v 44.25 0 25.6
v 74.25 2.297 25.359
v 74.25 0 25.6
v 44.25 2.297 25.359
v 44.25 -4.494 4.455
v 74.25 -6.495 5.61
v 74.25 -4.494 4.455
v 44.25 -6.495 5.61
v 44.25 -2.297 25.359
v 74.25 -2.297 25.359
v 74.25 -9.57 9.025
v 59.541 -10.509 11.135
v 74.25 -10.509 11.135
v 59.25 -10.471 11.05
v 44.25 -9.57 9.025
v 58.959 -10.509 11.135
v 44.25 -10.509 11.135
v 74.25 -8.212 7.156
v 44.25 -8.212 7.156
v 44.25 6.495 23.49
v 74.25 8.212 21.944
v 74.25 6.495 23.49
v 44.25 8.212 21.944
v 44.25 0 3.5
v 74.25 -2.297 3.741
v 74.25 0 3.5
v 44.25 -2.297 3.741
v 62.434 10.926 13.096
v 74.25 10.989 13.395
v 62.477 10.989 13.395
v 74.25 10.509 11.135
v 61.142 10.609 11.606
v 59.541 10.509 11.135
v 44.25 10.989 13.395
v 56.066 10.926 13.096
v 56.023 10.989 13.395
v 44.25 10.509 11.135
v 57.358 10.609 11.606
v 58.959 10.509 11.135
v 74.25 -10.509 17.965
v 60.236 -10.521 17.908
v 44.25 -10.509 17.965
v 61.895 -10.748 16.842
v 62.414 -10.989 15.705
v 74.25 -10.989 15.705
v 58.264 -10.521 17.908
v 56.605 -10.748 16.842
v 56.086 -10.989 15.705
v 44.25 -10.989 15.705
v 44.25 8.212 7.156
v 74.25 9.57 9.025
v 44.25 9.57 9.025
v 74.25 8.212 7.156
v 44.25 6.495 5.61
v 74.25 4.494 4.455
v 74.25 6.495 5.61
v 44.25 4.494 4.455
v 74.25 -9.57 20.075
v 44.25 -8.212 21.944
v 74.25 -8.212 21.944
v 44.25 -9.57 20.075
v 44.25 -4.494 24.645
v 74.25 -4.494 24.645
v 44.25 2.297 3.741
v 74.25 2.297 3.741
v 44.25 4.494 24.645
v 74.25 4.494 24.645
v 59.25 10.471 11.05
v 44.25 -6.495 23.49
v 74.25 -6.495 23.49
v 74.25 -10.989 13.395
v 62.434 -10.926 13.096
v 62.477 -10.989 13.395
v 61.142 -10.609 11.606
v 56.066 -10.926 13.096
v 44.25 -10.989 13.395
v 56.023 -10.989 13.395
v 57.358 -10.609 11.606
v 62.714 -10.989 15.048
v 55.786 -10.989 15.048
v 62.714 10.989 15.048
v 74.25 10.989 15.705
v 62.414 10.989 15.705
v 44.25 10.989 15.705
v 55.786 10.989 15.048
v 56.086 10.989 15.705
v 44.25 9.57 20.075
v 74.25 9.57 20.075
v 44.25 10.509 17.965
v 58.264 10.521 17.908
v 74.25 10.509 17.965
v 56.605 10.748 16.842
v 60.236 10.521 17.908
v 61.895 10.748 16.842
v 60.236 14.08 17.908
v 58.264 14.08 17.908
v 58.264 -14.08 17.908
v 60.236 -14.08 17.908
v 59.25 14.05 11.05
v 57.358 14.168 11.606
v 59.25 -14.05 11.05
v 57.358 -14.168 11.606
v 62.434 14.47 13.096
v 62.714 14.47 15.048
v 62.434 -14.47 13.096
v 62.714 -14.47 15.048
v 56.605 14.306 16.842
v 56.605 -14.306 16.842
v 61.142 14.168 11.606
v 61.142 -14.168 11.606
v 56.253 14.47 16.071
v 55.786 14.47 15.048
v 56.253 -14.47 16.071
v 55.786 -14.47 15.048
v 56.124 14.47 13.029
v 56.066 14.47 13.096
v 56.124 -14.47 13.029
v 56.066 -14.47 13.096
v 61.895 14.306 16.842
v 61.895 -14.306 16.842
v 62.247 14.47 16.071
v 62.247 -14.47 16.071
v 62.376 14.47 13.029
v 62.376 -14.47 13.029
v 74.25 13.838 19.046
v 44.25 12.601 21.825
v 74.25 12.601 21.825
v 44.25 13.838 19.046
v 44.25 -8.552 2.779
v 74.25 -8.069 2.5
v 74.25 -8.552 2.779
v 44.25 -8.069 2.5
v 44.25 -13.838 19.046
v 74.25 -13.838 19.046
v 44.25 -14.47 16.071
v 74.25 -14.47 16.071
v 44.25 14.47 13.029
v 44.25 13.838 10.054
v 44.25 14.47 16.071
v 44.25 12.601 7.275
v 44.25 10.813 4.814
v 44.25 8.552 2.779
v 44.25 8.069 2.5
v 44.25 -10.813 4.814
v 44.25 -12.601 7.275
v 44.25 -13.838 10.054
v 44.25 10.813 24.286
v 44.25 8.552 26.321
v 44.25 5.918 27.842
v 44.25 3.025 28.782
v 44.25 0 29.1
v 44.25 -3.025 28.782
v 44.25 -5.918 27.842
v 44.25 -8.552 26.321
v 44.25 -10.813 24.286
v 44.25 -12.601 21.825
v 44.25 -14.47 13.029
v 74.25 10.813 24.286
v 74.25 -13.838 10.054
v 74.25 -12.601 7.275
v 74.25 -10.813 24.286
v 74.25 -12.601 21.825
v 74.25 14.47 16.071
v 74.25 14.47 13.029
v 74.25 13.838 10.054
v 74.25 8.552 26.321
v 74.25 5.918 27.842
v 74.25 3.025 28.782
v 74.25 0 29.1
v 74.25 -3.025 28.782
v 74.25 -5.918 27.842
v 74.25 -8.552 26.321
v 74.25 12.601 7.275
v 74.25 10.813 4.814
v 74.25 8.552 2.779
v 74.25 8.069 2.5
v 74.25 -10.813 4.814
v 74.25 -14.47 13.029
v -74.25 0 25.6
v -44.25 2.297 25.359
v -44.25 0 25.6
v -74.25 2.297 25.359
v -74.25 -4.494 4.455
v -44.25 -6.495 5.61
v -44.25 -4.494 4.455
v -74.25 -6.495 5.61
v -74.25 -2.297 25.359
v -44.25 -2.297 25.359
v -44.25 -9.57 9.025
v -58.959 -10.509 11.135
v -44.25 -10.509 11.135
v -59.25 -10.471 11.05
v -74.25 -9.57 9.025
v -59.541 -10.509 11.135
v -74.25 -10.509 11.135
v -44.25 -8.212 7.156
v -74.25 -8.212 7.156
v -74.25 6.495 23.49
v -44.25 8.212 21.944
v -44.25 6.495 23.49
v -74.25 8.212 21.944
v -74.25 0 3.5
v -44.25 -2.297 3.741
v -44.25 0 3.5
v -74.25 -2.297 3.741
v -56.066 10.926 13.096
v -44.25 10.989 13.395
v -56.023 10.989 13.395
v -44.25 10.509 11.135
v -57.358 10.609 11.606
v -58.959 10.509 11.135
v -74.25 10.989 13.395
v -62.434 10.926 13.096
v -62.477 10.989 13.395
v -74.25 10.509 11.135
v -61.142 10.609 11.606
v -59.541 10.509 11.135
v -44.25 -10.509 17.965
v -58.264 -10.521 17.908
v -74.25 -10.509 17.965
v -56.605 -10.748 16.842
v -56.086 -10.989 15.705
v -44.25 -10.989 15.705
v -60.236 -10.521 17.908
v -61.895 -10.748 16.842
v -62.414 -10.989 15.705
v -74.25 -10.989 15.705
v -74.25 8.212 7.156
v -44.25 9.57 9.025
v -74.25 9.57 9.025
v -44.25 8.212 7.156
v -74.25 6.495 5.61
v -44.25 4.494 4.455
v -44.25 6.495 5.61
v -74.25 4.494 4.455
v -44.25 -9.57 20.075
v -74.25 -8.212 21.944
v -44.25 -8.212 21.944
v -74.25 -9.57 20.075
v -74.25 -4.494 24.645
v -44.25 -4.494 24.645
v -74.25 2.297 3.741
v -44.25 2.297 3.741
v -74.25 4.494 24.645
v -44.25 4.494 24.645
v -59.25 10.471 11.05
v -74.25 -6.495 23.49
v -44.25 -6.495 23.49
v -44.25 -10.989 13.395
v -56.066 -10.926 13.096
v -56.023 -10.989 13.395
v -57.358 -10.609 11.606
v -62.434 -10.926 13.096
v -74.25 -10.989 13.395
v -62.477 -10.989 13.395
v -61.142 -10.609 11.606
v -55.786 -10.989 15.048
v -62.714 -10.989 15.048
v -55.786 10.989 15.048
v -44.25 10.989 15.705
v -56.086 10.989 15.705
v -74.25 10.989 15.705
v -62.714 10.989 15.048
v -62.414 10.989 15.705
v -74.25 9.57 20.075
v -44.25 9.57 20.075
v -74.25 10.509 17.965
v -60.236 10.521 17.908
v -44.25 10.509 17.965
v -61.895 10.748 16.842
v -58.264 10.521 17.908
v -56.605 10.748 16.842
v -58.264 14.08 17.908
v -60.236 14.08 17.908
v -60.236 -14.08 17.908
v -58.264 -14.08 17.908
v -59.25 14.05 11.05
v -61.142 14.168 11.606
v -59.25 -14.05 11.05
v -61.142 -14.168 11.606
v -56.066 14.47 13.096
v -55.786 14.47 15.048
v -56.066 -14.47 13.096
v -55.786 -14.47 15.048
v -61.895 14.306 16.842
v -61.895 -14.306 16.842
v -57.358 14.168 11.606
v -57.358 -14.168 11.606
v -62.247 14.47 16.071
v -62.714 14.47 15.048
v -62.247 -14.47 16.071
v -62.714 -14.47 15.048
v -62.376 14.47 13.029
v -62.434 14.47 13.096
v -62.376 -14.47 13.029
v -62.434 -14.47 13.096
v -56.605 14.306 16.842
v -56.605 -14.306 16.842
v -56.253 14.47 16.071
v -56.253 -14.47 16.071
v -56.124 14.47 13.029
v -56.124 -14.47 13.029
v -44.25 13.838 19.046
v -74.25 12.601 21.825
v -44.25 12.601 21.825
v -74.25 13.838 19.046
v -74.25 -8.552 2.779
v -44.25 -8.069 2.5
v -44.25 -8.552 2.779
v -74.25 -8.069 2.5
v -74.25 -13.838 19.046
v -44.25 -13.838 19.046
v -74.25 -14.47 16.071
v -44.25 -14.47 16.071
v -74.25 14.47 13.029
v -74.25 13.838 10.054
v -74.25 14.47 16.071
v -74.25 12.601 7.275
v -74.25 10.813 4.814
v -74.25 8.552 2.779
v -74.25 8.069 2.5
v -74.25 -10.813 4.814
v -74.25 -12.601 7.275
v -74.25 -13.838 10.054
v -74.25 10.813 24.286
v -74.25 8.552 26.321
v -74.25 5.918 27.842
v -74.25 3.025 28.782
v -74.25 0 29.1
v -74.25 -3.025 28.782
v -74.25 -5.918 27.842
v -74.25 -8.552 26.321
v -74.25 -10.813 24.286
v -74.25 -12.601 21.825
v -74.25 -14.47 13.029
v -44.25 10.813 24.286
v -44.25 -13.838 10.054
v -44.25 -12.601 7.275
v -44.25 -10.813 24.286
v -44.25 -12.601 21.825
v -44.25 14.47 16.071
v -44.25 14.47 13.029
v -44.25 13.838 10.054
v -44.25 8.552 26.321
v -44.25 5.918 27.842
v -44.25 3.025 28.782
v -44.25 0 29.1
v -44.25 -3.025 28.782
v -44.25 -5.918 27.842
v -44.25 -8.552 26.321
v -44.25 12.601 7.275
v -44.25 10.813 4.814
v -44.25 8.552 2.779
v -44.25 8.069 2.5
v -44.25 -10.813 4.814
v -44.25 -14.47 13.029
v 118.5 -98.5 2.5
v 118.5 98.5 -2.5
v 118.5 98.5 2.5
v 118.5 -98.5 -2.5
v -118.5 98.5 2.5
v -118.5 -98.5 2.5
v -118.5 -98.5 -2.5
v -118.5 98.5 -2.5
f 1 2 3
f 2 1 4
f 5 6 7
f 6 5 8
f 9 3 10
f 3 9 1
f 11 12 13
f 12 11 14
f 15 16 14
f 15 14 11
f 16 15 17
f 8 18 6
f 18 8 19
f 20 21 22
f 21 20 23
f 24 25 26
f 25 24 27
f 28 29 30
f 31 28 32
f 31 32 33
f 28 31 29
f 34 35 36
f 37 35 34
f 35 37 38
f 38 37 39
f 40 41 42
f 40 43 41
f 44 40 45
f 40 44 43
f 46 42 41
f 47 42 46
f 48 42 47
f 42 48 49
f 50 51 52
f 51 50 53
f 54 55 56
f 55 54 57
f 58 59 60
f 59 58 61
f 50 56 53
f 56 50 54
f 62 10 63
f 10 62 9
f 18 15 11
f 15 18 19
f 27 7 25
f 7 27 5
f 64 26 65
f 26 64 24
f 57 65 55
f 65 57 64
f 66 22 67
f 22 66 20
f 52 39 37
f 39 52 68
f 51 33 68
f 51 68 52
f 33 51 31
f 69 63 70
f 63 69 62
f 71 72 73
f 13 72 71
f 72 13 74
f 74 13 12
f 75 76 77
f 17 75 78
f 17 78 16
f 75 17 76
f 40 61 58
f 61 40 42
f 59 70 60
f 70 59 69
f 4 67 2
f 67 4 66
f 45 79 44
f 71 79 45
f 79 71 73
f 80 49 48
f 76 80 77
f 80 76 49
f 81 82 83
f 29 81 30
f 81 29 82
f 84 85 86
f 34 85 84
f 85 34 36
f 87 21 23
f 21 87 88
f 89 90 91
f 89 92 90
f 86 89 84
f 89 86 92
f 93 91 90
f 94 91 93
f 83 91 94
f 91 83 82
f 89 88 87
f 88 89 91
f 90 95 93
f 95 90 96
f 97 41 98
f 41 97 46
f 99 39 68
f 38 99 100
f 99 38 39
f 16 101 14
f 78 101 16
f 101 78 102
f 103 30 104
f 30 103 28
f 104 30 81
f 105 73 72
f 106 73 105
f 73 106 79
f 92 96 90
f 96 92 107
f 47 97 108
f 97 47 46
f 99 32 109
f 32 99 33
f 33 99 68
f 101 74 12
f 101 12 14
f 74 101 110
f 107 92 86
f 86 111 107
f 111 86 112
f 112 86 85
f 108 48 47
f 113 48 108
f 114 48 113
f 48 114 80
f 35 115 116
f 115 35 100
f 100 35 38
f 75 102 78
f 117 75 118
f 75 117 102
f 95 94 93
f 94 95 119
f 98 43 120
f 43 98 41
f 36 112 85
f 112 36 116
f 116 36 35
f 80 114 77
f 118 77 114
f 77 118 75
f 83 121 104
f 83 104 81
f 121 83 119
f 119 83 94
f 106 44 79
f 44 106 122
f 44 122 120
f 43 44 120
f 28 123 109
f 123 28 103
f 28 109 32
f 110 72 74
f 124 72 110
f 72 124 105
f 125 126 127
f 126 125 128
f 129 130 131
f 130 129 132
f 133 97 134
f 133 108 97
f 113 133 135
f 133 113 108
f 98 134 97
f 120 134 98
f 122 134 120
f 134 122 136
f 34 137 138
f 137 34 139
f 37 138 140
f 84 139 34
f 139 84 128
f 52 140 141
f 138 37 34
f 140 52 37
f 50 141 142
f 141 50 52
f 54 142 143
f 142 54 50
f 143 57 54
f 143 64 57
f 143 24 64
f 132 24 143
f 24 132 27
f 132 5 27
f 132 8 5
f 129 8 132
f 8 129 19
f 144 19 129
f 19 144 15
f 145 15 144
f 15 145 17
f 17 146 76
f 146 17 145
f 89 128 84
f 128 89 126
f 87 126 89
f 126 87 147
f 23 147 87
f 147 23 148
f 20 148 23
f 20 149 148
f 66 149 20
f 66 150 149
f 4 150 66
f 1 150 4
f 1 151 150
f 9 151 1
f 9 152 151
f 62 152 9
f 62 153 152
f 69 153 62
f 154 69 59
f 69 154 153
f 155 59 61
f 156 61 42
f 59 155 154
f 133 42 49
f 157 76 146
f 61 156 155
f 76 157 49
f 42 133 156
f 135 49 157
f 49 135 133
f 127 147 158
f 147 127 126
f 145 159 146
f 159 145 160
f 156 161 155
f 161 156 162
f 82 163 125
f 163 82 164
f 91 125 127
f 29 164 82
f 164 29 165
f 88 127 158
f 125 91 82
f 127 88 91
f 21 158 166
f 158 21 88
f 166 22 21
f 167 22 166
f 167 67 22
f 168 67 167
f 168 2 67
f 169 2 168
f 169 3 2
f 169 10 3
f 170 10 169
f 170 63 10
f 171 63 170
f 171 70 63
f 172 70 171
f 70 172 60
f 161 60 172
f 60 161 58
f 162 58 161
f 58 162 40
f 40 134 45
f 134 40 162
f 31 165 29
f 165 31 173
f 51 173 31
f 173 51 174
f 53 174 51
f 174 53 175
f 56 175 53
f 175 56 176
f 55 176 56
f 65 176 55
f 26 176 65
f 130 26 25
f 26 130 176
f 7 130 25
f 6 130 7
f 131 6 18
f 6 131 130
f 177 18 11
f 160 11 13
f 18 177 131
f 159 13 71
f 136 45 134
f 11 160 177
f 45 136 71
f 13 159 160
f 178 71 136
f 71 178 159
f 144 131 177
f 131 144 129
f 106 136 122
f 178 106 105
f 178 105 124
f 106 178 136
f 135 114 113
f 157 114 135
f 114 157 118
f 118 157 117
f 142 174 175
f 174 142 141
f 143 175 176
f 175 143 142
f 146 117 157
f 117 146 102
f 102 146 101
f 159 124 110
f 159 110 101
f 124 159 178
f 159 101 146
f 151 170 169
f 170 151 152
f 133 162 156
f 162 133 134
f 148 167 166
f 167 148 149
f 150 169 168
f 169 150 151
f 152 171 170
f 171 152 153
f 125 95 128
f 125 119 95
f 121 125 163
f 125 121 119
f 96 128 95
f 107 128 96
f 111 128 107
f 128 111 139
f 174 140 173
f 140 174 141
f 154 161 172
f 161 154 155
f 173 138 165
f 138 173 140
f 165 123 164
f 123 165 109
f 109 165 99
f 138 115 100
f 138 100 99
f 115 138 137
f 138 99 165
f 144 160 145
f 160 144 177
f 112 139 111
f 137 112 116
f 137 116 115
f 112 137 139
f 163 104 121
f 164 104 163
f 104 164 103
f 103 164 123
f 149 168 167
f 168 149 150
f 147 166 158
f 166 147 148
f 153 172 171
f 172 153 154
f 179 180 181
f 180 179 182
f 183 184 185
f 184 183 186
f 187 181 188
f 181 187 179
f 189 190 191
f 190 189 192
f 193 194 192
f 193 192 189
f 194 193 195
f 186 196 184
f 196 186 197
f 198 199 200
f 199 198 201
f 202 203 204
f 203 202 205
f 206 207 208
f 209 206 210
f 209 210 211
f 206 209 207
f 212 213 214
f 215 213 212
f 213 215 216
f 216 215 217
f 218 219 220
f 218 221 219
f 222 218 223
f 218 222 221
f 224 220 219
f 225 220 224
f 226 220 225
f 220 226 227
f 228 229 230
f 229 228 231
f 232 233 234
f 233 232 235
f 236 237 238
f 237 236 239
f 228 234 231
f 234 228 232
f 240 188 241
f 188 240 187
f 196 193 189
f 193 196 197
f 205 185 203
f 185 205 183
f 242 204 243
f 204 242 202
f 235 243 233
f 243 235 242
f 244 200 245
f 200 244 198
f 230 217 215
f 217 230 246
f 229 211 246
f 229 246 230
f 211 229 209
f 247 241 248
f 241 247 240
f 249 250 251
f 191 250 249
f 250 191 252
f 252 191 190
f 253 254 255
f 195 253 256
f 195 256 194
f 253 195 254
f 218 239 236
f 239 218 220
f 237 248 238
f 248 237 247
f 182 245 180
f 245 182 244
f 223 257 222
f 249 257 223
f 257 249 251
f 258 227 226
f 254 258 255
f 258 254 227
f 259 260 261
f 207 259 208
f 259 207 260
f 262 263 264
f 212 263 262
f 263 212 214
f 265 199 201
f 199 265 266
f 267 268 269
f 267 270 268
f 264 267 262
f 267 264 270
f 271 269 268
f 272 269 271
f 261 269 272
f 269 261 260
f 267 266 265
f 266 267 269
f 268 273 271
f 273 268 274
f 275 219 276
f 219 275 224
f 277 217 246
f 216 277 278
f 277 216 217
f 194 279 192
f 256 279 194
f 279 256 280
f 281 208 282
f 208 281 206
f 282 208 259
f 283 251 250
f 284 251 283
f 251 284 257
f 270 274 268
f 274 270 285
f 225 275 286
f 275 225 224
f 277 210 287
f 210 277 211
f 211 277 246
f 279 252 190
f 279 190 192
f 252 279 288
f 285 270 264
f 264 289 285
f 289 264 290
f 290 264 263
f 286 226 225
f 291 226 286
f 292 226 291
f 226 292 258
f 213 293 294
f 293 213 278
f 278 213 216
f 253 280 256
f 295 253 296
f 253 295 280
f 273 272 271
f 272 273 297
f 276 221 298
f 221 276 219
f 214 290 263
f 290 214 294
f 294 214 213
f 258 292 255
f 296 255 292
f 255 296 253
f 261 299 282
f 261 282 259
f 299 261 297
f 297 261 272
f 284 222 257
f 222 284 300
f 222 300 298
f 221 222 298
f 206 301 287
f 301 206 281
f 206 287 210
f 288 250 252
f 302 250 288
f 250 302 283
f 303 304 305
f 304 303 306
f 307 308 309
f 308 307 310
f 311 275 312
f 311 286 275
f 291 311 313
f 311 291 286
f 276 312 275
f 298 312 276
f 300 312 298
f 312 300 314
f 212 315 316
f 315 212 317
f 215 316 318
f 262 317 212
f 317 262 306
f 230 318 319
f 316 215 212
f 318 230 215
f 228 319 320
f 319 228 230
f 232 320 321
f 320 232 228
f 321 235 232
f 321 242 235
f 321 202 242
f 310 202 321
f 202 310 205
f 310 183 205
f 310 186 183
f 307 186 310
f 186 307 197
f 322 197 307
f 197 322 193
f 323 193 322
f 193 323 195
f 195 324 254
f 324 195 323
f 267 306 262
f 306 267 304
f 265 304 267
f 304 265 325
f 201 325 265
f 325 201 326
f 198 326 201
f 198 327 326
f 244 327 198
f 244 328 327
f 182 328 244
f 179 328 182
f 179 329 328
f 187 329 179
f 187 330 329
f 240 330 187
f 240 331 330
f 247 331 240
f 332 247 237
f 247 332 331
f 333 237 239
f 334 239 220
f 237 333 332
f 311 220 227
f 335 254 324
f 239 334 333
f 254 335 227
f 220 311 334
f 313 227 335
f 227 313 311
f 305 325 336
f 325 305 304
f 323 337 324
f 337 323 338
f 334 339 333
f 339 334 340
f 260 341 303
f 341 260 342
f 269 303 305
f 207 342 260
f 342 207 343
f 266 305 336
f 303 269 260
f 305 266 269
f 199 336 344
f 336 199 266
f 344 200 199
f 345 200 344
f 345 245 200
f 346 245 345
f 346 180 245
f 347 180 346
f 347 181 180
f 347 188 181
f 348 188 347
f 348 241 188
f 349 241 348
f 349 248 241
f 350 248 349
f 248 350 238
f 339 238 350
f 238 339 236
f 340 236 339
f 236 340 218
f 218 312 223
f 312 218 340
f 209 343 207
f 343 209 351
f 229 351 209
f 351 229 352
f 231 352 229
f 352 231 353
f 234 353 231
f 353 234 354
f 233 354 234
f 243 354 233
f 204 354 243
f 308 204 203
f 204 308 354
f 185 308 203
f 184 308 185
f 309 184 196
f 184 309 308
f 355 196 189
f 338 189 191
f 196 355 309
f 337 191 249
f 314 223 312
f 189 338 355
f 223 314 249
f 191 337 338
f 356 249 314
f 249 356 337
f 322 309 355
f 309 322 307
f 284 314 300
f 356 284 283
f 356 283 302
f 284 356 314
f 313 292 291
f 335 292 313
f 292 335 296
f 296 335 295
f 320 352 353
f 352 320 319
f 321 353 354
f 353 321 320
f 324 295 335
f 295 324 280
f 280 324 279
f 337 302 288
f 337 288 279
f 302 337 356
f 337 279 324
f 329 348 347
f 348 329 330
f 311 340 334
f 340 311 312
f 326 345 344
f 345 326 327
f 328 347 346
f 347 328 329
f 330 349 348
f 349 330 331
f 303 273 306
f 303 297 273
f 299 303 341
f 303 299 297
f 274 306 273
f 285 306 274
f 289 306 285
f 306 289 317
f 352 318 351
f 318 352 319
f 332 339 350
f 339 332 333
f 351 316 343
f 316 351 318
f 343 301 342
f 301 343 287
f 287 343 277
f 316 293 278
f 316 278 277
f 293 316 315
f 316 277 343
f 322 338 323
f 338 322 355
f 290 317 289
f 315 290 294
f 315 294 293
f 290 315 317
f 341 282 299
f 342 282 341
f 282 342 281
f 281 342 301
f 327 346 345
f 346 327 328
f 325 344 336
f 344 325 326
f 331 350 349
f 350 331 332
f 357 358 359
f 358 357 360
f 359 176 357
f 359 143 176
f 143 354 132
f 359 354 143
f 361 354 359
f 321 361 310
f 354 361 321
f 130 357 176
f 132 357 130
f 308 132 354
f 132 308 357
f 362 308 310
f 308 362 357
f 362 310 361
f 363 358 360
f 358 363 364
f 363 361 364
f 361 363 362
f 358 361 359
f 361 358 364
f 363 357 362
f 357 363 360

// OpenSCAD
// file: parameters/commonParameters.scad
// All measurements in millimeters

// "horizontal" and "vertical" refer to how they are printed on the print bed,
// not how they work on the final assembly.
// ALWAYS print verticle pipes straight up if possible, that is 90 degrees from the bed.
// Attempting to print a slanted pipe will be troublesome and require testing for a proper size.
// However, you can print ANY angle ON the bed.

// 1.25" PVC Pipe:
horizontalPipeInsideDiameter_1_25pvc = 42.9;
verticalPipeInsideDiameter_1_25pvc = 42.5;

// 0.5" PVC Pipe:
horizontalPipeInsideDiameter_0_50pvc = 22.1;
verticalPipeInsideDiameter_0_50pvc = 21.7;

// Parameters
jointLegLength = 50;
jointWallThickness = 3.5;
jointPinningHoleDiameter = 7;
jointPinHoleOffset = 10;

// Walker Foot Parameters
inchesToMmConversionFactor = 25.4;

// Current idea is 11 x 21 inches.
walkerFootHeight = 11 * inchesToMmConversionFactor;
walkerFootLength = 21 * inchesToMmConversionFactor;
// Back of Foot is 4 inches longer to cause foot to hang AND LOOK as desired
// I tried 1 inch and it had basically NO affect on how it hangs.
// I think it looks cool at 4 inches, so I am going to test that.
// I *THINK* that it actually doesn't affect lenght of the walker, because the front
// of one compensates for the back of the other.
walkerFootCenterOffset = 4 * inchesToMmConversionFactor; // Remember to multiply any offset by the conversion factor.
walkerFootFrontLength = (walkerFootLength / 2) - (walkerFootCenterOffset / 2);
walkerFootBackLength = (walkerFootLength / 2) + (walkerFootCenterOffset / 2);

footLowerJointLegLength = 75;

// Angles
// This site is great for visualizing what you want: https://www.blocklayer.com/trig/scaleneeng.aspx
// Use this site to check your math and results: https://www.calculator.net/right-triangle-calculator.html
echo("=======================================================");
echo("Walker Foot Parameters");
echo("walkerFootLength", walkerFootLength, walkerFootFrontLength + walkerFootBackLength);
echo("=======================================================");
echo("Front:");
echo("walkerFootHeight (a)", walkerFootHeight);
echo("walkerFootFrontLength (b)", walkerFootFrontLength);
walkerFootFrontTriangleTopLength = sqrt(pow(walkerFootHeight, 2) + pow(walkerFootFrontLength, 2));
echo("walkerFootFrontTriangleTopLength (c)", walkerFootFrontTriangleTopLength);
walkerFootFrontJointAngle = asin(walkerFootHeight / walkerFootFrontTriangleTopLength);
echo("walkerFootFrontJointAngle (α):", walkerFootFrontJointAngle);
walkerAnkleFrontAngle = asin(walkerFootFrontLength / walkerFootFrontTriangleTopLength);
echo("walkerAnkleFrontAngle (β)", walkerAnkleFrontAngle);
echo("-------------------------------------------------------");
echo("Back");
echo("walkerFootBackLength (b)", walkerFootBackLength);
walkerFootBackTriangleTopLength = sqrt(pow(walkerFootHeight, 2) + pow(walkerFootBackLength, 2));
echo("walkerFootBackTriangleTopLength (c)", walkerFootBackTriangleTopLength);
walkerFootBackJointAngle = asin(walkerFootHeight / walkerFootBackTriangleTopLength);
echo("walkerFootBackJointAngle (α):", walkerFootBackJointAngle);
walkerAnkleBackAngle = asin(walkerFootBackLength / walkerFootBackTriangleTopLength);
echo("walkerAnkleBackAngle (β)", walkerAnkleBackAngle);
echo("=======================================================");

walkerBodyLowerShaftHolderRollerBearingHeightAboveThrustBearing = 50;

// Colors
JointColor = "CornflowerBlue";
PipeColor = "Pink";

// Resoution
// This is perfect for 3D Printing,
// but you may want to comment it out while working to improve preview
// performance
//$fa = 1;
//$fs = 0.4;
// Although this makes it VERY high rez, which might be better for the slicer? Experimenting with it instead.
// NOTE that using $fn causes FreeCAD and hence .step files exported to Fusion 360 to show round items as a series of faces instead of a single object.
//$fn = 500;
// main file
// Load in some defaults
include <parameters/commonParameters.scad>;

panelThickness = 5;
panelHeight = 237;
panelWidth = 197;

pipeHolderLength = 30;

cube([panelHeight, panelWidth, panelThickness], center =
true);

// These are used to mount the panel to a pipe
include <modules/jointModule.scad>;
jointPinHoleOffset = 15;
// Pick what size pipes you are using
horizontalPipeInsideDiameter = horizontalPipeInsideDiameter_0_50pvc;

jointLegs = [
        [[0, 90, 0], horizontalPipeInsideDiameter, false, true, pipeHolderLength],
    ];

translate([(panelHeight / 4) + (pipeHolderLength / 2), 0, (horizontalPipeInsideDiameter / 2) + jointWallThickness])
    rotate([0, 0, 180]) joint(jointLegs, horizontalPipeInsideDiameter, false);

translate([- (panelHeight / 4) + (pipeHolderLength / 2), 0, (horizontalPipeInsideDiameter / 2) + jointWallThickness])
    rotate([0, 0, 180]) joint(jointLegs, horizontalPipeInsideDiameter, false);
